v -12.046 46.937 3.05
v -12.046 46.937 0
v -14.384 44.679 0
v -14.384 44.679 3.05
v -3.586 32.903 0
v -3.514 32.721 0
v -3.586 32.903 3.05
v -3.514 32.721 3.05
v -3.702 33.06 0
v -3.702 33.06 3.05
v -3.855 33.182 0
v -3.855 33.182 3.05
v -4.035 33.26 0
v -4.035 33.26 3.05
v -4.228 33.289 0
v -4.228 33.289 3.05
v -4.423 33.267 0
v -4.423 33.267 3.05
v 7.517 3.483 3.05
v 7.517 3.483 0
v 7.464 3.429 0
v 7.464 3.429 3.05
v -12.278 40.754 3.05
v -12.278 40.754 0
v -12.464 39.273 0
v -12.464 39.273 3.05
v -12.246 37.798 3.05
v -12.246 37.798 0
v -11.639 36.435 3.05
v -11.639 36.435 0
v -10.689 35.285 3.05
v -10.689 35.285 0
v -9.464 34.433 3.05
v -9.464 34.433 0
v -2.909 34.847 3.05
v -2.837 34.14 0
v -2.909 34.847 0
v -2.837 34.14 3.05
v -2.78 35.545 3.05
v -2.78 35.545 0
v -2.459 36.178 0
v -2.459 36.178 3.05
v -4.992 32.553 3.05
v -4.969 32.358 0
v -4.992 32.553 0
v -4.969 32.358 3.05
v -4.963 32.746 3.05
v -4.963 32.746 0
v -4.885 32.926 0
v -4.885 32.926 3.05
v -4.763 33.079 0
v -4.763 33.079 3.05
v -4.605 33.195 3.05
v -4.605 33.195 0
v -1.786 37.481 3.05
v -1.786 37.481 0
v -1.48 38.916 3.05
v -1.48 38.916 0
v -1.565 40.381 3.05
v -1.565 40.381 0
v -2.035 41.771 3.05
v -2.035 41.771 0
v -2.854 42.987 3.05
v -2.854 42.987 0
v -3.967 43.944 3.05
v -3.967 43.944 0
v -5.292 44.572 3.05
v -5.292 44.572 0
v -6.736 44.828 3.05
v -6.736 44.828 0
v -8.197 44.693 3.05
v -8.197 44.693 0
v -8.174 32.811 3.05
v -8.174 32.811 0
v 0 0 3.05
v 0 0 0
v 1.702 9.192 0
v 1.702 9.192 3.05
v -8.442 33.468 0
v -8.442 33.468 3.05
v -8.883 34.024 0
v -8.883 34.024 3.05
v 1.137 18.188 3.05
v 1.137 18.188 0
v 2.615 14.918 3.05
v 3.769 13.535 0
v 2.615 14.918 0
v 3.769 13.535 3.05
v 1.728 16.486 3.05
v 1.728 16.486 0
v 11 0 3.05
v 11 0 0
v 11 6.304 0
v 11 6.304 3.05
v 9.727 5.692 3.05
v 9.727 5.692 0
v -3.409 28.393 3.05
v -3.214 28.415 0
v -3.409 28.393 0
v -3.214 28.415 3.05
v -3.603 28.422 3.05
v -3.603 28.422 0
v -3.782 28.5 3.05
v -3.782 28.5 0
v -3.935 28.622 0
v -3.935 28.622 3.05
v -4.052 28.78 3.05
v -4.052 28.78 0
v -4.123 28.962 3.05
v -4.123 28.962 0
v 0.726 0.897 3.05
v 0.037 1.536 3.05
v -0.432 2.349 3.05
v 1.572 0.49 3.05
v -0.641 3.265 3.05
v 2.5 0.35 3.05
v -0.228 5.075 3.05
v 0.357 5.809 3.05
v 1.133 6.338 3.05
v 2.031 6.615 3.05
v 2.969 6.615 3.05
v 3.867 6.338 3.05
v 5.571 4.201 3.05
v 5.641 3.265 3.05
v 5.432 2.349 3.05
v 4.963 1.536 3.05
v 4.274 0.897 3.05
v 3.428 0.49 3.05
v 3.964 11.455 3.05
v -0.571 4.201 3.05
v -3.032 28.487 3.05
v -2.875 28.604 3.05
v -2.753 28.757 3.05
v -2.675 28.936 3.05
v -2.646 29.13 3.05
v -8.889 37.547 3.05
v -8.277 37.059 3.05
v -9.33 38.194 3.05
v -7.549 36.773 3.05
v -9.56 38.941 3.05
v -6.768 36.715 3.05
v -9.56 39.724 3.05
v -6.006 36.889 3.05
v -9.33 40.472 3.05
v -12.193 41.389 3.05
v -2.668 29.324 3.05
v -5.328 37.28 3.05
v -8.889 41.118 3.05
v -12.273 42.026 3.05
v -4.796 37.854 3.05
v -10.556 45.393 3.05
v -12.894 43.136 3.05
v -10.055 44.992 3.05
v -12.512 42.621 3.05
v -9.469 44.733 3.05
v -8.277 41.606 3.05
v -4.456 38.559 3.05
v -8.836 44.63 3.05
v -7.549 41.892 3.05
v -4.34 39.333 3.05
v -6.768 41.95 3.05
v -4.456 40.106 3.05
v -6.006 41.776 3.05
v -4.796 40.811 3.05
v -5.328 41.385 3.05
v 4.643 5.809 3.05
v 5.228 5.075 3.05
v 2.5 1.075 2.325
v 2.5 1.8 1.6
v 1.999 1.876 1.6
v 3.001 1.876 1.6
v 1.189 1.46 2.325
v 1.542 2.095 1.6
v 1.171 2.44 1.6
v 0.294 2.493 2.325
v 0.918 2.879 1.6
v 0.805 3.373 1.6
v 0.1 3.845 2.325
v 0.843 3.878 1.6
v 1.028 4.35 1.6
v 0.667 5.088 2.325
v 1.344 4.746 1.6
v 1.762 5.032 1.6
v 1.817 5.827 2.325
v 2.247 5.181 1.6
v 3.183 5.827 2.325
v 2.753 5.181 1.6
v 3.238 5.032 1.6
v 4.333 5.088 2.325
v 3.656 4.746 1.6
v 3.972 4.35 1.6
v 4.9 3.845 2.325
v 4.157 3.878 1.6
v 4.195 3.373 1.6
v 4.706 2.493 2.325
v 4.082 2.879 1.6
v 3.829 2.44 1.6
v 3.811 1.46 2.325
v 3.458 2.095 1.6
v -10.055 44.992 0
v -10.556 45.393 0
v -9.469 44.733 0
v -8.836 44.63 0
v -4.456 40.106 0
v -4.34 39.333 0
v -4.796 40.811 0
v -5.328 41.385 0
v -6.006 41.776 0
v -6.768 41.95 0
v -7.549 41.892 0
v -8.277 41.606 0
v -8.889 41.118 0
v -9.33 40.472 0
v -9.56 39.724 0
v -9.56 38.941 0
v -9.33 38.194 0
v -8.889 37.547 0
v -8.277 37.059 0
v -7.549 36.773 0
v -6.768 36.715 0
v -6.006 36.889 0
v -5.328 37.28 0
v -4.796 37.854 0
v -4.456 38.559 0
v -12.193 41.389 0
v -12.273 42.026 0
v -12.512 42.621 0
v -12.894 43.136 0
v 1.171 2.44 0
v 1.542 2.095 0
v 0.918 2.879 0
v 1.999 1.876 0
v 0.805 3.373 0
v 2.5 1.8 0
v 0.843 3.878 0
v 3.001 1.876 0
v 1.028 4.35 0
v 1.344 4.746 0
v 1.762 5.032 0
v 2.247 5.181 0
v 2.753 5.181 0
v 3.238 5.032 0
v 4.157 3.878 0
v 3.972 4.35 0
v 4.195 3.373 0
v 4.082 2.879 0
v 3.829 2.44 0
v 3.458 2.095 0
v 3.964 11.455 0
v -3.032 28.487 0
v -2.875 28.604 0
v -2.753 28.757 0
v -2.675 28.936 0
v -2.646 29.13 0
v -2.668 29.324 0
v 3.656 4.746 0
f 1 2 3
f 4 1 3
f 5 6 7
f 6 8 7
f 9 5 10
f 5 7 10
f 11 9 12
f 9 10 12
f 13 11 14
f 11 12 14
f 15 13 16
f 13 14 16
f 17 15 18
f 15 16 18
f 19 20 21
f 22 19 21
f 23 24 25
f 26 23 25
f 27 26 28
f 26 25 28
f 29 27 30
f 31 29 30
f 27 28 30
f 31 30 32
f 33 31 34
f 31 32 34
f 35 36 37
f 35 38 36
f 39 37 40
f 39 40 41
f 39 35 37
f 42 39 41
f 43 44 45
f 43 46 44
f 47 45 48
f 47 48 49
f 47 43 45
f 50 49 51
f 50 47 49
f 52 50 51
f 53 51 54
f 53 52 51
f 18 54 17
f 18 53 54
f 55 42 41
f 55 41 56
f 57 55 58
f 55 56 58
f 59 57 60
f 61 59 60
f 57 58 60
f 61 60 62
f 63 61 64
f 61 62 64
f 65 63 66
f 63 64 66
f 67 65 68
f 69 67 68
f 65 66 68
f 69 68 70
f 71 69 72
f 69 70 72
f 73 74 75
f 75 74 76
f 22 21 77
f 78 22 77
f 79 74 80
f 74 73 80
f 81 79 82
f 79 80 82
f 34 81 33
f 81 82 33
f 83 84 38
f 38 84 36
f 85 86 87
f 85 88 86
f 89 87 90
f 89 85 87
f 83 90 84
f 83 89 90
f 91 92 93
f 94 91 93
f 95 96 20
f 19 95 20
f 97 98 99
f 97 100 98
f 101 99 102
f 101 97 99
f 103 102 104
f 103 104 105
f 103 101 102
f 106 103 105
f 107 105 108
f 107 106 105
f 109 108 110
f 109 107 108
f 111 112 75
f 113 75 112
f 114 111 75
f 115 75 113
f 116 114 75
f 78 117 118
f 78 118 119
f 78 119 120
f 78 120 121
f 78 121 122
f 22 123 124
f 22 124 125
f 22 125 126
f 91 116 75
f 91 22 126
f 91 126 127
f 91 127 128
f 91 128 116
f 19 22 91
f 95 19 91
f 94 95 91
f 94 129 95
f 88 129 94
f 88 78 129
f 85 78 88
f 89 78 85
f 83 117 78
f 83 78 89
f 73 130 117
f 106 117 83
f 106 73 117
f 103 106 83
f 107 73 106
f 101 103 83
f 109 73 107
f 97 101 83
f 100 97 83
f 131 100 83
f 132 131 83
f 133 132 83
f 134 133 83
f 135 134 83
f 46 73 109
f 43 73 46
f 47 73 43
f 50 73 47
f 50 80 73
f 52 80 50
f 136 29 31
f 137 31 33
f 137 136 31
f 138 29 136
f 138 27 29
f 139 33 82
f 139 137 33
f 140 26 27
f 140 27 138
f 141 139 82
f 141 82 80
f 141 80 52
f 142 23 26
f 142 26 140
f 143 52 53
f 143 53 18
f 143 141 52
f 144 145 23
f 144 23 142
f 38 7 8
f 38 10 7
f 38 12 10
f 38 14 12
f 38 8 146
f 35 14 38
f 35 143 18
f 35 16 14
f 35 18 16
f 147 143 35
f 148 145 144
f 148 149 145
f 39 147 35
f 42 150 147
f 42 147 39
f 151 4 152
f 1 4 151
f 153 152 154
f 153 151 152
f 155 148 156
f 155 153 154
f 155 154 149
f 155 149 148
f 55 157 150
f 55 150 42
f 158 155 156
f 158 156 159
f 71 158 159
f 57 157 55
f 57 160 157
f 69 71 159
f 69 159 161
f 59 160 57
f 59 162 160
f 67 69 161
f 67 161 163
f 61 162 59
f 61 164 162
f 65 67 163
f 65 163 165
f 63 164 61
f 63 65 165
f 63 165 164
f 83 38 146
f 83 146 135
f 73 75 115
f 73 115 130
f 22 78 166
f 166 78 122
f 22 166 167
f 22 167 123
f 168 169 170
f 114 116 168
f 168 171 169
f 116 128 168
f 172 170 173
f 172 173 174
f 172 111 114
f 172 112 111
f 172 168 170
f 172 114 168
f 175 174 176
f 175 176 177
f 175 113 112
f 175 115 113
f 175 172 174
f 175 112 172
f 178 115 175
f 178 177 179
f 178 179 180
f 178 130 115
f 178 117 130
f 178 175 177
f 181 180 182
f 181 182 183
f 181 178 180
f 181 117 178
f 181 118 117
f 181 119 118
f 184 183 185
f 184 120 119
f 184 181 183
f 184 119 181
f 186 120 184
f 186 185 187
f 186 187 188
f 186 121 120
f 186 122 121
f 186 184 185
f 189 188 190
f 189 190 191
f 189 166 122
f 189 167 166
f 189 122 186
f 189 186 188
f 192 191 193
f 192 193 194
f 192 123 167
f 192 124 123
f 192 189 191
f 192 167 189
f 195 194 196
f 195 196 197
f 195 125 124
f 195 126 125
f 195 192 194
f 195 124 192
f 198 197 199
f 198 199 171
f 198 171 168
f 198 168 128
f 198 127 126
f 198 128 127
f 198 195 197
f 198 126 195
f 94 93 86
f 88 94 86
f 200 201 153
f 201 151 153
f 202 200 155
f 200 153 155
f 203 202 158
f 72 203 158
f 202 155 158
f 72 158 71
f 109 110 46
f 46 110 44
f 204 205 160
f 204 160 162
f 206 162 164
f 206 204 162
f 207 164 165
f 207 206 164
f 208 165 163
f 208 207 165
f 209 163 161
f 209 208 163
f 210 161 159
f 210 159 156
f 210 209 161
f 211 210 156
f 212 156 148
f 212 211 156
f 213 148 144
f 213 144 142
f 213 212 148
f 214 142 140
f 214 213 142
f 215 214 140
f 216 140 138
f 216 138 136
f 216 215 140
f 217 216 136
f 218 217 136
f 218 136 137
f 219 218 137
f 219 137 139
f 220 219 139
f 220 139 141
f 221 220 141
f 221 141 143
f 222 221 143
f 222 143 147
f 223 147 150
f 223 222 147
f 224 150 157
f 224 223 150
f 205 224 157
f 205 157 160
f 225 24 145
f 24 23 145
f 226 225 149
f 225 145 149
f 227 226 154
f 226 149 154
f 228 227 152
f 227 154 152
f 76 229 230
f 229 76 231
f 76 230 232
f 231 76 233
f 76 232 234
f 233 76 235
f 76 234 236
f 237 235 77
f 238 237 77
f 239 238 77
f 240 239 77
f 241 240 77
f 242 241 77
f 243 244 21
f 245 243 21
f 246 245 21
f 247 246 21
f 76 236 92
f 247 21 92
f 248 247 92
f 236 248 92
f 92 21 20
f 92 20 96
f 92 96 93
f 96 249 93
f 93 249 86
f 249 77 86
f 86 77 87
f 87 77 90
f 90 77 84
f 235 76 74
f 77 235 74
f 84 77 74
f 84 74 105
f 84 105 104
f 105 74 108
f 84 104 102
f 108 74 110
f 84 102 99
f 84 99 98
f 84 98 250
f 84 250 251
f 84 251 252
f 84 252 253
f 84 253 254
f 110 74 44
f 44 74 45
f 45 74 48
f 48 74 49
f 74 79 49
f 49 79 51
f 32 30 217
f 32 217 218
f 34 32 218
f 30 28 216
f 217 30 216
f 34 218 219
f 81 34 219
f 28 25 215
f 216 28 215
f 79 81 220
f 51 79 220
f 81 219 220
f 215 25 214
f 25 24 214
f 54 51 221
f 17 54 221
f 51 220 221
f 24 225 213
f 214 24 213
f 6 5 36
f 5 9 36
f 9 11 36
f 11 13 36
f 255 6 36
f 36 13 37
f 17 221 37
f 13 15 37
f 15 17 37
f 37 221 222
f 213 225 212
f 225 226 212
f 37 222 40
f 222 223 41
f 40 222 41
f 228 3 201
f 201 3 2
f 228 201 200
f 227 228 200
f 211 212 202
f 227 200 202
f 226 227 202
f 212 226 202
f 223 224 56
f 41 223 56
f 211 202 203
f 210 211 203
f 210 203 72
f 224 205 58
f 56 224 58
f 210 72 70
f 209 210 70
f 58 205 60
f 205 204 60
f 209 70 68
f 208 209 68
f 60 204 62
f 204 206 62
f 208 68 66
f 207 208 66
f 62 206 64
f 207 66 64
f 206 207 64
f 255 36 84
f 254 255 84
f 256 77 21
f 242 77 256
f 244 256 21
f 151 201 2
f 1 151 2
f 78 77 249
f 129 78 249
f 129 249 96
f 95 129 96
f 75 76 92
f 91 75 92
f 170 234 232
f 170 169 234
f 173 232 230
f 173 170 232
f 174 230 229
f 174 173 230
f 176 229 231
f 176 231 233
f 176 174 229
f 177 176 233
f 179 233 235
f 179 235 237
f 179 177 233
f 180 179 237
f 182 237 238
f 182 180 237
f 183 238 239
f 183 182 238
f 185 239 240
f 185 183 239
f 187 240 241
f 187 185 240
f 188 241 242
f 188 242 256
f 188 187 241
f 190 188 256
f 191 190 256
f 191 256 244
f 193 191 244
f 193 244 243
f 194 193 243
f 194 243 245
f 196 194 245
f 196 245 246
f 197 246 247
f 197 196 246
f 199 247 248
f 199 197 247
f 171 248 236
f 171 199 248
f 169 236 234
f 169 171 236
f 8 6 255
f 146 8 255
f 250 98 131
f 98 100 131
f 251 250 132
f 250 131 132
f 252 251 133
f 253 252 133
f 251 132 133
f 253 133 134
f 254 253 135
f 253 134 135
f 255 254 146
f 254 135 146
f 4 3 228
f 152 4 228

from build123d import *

# Parameters (mm, degrees)
SKETCH1_R           = 1.5
SKETCH1_R_2         = 2.625
BOSS_EXTRUDE1_DEPTH = 3.05
FILLET3_R           = 2.5
FILLET4_R           = 10
FILLET6_R           = 0.75


with BuildPart() as part:
    # Sketch1 → Boss-Extrude1 (new body)
    with BuildSketch(Plane.XY):
        with BuildLine():
            Line((-8.481662584, 34.046021185), (0, 0))
            Line((0, 0), (11, 0))
            Line((11, 0), (11, 6.303908615))
            Line((11, 6.303908615), (1.807611845, 15.496296771))
            Line((1.807611845, 15.496296771), (-3.144779945, 35.375563851))
            ThreePointArc((-3.144779945, 35.375563851), (-2.481245275, 42.518446356), (-9.444822751, 44.241709966))
            Line((-9.444822751, 44.241709966), (-12.046172881, 46.936525265))
            Line((-12.046172881, 46.936525265), (-14.384461968, 44.67933583))
            Line((-14.384461968, 44.67933583), (-11.783111838, 41.984520531))
            ThreePointArc((-11.783111838, 41.984520531), (-12.042982397, 37.220695866), (-8.481662584, 34.046021185))
        make_face()
        with Locations((2.5, 3.5)):
            Circle(SKETCH1_R, mode=Mode.SUBTRACT)
        Polygon((9.727207794, 5.692209589), (7.517499103, 3.482500897), (7.464466094, 3.429467889), (1.701545827, 9.192388155), (3.964287527, 11.455129855), align=None, mode=Mode.SUBTRACT)
        Polygon((-3.942100566, 28.234165792), (-5.150775718, 33.085877281), (-3.695262271, 33.448479827), (-2.48658712, 28.596768337), align=None, mode=Mode.SUBTRACT)
        with Locations((-6.964638989, 39.33266846)):
            Circle(SKETCH1_R_2, mode=Mode.SUBTRACT)
    extrude(amount=BOSS_EXTRUDE1_DEPTH)

    # Sketch3 → CSK for M3 Flat Head Machine Screw1 (revolve, cut)
    with BuildSketch(Plane(origin=(2.5, 3.5, 3.05), x_dir=(0, -1, 0), z_dir=(1, 0, 0))):
        Polygon((0, 0), (0, 3.05), (1.7, 3.05), (1.7, 1.45), (3.15, 0), align=None)
    revolve(axis=Axis((2.5, 3.5, 9.4), (0, 0, -1)), mode=Mode.SUBTRACT)

    # Fillet3
    fillet3_edges = [part.edges().sort_by_distance(p)[0] for p in [
        (-3.144779945, 35.375563851, 1.525),
        (-8.481662584, 34.046021185, 1.525),
        (-11.783111838, 41.984520531, 1.525),
        (-9.444822751, 44.241709966, 1.525),
    ]]
    fillet(fillet3_edges, radius=FILLET3_R)

    # Fillet4
    fillet4_edges = [part.edges().sort_by_distance(p)[0] for p in [
        (1.807611845, 15.496296771, 1.525),
    ]]
    fillet(fillet4_edges, radius=FILLET4_R)

    # Fillet6
    fillet6_edges = [part.edges().sort_by_distance(p)[0] for p in [
        (-2.48658712, 28.596768337, 1.525),
        (-3.942100566, 28.234165792, 1.525),
        (-3.695262271, 33.448479827, 1.525),
        (-5.150775718, 33.085877281, 1.525),
    ]]
    fillet(fillet6_edges, radius=FILLET6_R - 0.0001)  # a hair under: the kernel refuses the full size


solid = part.part
